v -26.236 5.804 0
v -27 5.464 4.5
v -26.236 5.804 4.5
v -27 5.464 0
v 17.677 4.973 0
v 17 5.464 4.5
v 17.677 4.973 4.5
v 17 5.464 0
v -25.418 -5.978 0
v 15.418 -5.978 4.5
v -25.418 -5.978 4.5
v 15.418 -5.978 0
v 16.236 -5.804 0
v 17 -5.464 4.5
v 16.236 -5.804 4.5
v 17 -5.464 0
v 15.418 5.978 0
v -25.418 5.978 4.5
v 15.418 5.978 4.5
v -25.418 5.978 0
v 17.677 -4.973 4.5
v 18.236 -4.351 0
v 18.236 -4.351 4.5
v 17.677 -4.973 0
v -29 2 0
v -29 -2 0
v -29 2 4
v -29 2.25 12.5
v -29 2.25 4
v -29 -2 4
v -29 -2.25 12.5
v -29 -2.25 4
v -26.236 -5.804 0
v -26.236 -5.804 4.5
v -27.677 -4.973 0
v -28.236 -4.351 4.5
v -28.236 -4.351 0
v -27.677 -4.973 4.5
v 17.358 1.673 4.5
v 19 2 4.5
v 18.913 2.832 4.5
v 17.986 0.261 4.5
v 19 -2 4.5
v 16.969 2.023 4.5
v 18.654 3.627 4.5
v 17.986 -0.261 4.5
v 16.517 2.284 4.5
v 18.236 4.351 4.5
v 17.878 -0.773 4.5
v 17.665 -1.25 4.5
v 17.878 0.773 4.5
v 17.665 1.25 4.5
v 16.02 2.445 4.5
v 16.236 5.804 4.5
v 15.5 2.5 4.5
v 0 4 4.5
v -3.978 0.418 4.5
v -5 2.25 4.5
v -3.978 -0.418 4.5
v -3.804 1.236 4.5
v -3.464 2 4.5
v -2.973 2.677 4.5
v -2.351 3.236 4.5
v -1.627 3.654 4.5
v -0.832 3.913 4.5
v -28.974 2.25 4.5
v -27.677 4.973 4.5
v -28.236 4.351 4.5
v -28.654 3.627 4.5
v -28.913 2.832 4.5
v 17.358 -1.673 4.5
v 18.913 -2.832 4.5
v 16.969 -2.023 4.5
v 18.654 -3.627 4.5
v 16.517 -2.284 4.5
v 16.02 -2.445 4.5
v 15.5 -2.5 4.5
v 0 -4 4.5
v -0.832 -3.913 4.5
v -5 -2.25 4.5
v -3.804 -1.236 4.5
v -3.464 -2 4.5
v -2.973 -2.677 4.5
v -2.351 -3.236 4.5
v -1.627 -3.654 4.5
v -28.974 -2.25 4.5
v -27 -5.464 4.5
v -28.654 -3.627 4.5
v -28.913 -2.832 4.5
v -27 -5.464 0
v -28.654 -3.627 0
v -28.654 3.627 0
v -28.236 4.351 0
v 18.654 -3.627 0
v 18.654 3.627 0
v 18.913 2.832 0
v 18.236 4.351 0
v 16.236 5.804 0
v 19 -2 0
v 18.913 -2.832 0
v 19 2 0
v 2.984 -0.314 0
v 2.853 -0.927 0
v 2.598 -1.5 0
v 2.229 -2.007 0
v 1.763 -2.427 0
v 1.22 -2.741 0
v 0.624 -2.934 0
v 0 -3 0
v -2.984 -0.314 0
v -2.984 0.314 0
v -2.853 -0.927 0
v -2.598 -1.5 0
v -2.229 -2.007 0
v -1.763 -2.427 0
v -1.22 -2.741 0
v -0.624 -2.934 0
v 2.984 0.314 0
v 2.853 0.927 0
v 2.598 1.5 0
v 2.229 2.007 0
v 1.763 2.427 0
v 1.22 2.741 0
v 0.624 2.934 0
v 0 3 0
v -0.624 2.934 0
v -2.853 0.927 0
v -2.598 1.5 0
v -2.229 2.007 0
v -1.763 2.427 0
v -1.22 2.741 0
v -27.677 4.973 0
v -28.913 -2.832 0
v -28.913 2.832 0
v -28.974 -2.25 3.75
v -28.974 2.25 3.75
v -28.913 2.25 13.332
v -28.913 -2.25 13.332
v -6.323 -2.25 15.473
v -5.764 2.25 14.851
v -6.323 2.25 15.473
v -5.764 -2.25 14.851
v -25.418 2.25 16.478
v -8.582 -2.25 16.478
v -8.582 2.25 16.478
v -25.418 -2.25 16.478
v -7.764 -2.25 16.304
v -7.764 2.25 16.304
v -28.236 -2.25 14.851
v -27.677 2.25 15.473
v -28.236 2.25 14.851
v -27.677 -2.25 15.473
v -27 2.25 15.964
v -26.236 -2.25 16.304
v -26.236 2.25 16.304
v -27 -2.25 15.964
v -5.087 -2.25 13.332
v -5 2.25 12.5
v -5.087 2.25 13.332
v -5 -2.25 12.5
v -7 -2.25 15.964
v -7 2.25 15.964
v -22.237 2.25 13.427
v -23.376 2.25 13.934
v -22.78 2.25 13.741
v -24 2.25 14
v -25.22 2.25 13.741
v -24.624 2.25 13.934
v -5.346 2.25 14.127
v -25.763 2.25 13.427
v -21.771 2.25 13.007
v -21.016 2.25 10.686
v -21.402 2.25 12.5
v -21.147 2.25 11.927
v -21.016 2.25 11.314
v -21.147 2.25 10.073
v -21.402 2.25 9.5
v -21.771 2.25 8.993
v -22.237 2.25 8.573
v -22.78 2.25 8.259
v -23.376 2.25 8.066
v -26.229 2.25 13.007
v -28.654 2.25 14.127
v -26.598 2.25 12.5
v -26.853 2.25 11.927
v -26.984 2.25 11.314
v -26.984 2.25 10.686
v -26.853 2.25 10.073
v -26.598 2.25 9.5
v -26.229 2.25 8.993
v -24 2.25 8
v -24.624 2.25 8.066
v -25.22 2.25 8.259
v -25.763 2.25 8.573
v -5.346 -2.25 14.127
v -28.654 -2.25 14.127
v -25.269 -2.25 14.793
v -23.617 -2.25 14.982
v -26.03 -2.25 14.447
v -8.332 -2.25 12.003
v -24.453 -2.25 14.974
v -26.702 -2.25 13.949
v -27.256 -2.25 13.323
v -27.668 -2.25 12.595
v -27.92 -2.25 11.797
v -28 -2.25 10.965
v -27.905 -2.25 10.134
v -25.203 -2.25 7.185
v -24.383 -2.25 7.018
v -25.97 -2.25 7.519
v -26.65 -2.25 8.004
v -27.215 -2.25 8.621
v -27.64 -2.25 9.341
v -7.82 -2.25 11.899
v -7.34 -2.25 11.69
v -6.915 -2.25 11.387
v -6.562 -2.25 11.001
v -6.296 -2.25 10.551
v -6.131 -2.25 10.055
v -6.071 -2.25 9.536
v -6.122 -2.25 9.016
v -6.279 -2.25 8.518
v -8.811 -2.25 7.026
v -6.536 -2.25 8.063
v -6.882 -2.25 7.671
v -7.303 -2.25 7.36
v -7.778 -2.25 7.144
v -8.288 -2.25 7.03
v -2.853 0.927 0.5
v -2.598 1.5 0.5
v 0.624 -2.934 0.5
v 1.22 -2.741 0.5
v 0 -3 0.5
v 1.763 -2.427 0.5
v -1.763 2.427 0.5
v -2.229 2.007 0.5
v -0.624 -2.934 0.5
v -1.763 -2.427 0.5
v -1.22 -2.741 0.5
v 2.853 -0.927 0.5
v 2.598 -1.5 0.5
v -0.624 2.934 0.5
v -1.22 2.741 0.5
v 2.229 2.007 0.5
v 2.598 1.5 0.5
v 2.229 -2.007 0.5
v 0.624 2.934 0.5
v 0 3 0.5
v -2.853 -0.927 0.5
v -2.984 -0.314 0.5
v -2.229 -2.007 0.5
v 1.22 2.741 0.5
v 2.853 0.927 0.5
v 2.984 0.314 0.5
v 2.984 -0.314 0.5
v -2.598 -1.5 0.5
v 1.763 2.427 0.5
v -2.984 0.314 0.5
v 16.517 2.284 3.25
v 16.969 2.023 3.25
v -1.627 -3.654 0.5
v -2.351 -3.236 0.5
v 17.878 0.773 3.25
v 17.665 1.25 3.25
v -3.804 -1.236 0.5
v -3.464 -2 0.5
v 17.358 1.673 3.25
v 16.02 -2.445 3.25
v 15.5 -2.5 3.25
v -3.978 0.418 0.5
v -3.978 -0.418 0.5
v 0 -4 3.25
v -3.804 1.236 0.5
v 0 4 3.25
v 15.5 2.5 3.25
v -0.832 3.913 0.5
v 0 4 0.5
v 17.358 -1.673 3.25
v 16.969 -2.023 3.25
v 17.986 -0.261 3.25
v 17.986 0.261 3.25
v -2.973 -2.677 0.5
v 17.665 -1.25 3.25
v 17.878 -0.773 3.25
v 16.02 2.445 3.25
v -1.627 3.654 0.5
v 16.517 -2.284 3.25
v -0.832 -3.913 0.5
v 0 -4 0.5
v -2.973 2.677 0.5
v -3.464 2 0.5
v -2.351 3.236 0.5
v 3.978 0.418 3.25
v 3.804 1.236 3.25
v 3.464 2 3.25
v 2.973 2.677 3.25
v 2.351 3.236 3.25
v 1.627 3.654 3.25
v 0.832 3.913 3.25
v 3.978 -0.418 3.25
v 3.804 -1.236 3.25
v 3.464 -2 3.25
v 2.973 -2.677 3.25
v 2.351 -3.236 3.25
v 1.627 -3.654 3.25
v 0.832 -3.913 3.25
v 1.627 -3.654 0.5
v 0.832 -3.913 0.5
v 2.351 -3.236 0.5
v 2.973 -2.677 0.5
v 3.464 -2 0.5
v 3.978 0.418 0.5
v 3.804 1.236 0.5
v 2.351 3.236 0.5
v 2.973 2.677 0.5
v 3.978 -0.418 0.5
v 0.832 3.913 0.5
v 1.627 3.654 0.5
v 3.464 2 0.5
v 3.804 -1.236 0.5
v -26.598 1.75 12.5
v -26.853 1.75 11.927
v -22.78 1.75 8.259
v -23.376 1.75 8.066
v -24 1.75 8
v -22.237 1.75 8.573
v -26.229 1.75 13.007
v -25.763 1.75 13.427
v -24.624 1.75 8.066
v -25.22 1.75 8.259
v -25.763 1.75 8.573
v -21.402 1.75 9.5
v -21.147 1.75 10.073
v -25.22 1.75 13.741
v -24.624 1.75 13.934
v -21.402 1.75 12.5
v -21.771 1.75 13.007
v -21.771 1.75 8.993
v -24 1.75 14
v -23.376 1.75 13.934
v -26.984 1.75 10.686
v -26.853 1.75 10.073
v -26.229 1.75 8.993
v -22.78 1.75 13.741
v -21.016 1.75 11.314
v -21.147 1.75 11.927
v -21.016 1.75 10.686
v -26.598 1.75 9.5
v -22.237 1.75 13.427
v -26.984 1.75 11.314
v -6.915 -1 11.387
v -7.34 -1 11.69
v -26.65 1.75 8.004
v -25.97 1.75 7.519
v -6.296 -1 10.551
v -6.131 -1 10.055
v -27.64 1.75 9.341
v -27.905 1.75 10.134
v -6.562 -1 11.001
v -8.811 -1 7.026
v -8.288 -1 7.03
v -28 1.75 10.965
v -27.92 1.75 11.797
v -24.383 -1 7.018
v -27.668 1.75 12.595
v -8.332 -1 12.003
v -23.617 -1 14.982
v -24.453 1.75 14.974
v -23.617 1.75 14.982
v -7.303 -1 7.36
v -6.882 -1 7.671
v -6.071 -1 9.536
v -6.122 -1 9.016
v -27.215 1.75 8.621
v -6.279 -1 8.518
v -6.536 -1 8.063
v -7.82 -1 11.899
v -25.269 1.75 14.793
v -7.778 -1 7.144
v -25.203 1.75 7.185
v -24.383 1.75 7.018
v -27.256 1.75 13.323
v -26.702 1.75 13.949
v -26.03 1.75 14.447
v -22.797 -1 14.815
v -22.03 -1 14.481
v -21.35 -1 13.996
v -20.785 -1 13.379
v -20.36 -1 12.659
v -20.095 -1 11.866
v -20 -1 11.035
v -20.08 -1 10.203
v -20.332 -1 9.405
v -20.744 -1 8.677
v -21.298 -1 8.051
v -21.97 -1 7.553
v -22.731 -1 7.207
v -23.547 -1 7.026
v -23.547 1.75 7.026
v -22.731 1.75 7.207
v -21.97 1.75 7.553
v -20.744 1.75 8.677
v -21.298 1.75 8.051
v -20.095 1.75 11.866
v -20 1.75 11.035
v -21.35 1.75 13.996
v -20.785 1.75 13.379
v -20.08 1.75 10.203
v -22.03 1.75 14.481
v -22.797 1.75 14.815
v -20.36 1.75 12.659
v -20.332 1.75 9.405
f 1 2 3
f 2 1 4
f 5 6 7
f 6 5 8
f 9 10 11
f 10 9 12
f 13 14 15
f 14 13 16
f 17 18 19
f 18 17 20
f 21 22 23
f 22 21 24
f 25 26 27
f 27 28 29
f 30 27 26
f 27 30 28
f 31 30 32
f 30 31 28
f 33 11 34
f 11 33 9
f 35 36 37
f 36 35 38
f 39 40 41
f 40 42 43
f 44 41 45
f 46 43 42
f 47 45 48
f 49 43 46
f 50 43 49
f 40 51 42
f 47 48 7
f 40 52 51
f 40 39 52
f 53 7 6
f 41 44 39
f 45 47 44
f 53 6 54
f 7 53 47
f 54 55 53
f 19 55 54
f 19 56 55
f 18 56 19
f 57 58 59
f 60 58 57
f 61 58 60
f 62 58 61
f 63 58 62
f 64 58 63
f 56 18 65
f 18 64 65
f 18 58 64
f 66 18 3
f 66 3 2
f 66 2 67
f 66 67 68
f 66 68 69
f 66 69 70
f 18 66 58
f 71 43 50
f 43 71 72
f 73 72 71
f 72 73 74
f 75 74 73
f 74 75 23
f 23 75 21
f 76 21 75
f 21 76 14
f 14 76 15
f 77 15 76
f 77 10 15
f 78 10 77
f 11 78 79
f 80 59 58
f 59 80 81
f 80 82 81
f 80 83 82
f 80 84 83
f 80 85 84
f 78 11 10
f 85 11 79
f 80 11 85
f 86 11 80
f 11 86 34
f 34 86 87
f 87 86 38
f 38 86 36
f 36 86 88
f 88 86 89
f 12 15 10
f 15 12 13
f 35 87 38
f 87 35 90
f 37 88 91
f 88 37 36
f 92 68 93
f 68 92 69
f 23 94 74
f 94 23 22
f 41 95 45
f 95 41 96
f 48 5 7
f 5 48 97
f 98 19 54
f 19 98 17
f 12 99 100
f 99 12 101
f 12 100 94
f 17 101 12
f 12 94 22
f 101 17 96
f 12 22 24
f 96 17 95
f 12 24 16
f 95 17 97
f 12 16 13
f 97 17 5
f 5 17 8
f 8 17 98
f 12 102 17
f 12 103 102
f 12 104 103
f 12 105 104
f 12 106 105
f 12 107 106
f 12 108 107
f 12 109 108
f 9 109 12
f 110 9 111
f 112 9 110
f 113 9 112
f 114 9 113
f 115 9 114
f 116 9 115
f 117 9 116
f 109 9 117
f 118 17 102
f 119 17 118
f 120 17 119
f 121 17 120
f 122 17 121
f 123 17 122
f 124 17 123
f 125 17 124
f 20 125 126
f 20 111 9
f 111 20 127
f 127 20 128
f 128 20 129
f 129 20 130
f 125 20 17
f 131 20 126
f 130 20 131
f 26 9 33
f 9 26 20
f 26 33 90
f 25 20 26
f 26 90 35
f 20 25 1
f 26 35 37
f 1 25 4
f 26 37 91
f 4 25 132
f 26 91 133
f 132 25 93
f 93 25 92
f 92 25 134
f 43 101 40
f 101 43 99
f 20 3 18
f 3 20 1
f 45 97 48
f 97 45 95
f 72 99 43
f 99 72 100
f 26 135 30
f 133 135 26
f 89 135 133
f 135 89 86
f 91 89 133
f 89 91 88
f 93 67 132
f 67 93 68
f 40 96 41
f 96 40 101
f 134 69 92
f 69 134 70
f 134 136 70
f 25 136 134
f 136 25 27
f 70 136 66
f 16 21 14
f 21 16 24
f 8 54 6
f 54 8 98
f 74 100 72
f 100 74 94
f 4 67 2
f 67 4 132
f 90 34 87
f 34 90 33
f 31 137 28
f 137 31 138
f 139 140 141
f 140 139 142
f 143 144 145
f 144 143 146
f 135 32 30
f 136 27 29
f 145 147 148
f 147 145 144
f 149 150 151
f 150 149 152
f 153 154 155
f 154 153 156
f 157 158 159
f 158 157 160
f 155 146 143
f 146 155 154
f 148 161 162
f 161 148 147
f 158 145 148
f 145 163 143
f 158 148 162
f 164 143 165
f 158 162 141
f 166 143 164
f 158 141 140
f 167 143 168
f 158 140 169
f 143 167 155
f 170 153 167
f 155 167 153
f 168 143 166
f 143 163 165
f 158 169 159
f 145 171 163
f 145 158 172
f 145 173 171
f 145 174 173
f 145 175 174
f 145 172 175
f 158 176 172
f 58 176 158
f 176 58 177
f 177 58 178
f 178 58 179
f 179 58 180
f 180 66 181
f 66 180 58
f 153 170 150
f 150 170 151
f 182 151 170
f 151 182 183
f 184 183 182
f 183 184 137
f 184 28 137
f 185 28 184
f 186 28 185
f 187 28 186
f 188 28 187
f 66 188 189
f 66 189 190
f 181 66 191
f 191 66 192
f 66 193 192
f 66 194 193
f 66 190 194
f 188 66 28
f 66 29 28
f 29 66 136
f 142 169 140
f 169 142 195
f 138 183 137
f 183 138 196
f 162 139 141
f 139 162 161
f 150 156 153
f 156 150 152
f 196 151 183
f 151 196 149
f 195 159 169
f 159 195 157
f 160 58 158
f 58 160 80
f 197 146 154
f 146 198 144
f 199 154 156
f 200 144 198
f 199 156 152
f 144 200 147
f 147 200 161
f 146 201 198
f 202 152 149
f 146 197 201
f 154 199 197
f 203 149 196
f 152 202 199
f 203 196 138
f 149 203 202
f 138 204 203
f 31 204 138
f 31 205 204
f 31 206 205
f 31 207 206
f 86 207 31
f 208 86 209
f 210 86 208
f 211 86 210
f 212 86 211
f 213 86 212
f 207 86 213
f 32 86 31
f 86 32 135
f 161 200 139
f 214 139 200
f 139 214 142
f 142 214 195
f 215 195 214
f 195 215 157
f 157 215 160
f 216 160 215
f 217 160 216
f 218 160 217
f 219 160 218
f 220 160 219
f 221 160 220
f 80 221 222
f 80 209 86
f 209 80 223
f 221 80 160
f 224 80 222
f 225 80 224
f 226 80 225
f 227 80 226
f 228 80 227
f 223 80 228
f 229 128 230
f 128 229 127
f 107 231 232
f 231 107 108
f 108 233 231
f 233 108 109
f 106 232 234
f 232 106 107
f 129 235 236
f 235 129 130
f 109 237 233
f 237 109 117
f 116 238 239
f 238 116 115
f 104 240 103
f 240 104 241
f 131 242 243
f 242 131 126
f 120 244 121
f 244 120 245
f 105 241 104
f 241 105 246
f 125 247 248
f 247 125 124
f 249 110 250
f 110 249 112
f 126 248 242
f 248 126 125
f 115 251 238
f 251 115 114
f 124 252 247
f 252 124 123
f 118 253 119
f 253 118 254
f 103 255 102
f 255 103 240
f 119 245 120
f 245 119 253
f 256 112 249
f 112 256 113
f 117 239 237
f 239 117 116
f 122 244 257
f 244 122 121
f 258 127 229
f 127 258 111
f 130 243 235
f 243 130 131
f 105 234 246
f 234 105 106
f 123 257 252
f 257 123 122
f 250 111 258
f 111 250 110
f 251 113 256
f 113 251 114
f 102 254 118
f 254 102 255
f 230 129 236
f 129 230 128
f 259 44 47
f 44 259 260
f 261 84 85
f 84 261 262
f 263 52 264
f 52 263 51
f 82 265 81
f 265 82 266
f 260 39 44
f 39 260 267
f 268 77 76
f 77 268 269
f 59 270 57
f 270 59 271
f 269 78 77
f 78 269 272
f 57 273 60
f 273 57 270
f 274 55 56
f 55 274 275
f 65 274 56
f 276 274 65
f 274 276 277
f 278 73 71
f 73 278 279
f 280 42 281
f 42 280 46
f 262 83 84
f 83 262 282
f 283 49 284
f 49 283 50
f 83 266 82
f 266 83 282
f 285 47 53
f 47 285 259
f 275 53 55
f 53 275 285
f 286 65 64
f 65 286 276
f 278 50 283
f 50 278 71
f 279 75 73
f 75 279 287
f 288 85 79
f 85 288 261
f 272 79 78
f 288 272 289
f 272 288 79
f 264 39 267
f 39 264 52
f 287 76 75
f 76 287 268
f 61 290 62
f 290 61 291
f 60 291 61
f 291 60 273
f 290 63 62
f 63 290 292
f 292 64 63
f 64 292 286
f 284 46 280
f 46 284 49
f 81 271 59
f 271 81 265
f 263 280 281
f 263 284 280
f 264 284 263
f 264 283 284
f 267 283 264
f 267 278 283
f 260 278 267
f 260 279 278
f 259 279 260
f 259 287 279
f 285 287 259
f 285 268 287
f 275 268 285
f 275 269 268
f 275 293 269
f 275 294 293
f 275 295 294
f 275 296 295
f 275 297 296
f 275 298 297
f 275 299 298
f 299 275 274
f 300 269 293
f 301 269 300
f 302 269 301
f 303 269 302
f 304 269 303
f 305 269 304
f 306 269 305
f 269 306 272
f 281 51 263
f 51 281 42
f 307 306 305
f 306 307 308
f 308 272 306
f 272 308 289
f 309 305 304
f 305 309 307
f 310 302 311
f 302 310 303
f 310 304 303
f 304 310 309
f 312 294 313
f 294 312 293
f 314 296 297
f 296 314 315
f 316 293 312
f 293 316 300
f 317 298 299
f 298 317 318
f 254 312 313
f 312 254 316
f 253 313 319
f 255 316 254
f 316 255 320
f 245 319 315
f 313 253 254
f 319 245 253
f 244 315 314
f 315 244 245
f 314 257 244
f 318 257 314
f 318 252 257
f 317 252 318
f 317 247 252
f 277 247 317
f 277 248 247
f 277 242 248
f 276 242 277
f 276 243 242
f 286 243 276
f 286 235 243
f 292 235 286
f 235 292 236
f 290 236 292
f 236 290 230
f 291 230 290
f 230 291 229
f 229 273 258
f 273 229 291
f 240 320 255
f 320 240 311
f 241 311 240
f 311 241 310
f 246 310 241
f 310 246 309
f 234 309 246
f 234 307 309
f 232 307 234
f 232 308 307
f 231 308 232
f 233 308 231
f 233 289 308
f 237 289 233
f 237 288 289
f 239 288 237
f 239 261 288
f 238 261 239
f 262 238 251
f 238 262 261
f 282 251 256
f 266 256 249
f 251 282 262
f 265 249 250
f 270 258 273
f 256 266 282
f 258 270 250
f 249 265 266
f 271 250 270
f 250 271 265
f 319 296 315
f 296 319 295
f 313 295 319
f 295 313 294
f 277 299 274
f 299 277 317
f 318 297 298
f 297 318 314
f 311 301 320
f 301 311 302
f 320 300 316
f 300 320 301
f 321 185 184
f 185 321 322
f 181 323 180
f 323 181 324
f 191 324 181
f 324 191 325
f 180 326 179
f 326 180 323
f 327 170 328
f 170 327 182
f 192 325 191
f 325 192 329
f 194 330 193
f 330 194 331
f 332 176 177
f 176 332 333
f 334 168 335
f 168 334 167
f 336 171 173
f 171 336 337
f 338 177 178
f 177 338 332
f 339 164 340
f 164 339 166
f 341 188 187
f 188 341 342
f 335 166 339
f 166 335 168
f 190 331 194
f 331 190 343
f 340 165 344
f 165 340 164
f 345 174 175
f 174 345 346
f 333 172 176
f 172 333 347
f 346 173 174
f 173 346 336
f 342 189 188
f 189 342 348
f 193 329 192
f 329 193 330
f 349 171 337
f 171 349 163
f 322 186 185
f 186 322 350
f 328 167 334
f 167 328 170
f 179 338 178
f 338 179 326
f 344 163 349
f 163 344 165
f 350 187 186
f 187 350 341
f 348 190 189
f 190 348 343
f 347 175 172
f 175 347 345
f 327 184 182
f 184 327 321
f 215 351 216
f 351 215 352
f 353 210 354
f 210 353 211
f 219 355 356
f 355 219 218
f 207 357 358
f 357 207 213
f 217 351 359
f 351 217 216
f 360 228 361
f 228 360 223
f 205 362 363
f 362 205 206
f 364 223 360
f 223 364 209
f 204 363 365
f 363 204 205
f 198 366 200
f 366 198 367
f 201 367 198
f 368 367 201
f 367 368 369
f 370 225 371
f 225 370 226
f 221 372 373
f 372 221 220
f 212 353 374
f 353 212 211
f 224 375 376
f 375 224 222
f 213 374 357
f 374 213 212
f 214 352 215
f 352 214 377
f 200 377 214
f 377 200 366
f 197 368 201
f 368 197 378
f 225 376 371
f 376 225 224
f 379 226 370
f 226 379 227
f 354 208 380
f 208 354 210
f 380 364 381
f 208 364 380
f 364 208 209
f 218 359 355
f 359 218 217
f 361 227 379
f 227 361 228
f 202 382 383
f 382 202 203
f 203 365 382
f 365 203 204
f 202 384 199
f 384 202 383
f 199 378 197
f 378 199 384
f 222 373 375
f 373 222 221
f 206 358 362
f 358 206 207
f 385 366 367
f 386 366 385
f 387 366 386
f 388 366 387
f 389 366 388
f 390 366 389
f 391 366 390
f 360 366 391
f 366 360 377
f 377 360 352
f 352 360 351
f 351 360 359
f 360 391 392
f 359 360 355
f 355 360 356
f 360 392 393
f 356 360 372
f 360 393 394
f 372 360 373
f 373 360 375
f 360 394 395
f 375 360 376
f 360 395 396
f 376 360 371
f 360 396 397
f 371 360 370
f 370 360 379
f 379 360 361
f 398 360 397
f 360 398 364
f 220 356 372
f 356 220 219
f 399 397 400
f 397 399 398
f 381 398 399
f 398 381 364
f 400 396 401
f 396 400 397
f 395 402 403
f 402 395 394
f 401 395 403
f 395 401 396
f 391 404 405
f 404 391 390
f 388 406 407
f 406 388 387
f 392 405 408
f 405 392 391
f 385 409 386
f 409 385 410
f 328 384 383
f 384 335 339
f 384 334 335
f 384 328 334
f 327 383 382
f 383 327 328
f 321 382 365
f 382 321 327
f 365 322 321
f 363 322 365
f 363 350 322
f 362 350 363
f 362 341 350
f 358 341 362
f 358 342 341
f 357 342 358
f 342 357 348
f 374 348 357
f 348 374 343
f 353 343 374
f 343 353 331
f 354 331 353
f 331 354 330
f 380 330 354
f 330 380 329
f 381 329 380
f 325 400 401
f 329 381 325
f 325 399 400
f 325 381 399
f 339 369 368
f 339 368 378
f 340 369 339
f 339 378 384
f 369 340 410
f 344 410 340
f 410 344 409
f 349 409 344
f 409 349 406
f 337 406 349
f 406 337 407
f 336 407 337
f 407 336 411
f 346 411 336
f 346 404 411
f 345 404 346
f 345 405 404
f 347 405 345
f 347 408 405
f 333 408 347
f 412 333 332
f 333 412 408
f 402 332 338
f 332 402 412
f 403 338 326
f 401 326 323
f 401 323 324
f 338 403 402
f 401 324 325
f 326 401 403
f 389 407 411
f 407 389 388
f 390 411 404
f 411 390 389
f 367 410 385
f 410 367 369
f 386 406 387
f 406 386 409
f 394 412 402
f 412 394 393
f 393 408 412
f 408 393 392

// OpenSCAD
SERVO_WIDTH = 12;
SERVO_LENGTH = 22;
SERVO_HEIGHT = 28;

SERVO_TAB_LENGTH = 32;
SERVO_TAB_THICKNESS = 2.5;
SERVO_TAB_HEIGHT = 17;

SERVO_NUB_DIA = 6;
SERVO_NUB_HEIGHT = 5;
SERVO_NUB_OFFSET = SERVO_LENGTH/2 - 6;

SERVO_MOUNT_HOLE_DIA = 2;
SERVO_MOUNT_HOLE_SPACING = 28;

SERVO_ARM_DIA1 = 8; 
SERVO_ARM_DIA2 = 5;
SERVO_ARM_LENGTH = 22;
SERVO_ARM_THICKNESS = 4;
SERVO_ARM_FLAT_THICKNESS = 1.25;
SERVO_ARM_HEIGHT = SERVO_HEIGHT + SERVO_NUB_HEIGHT - SERVO_ARM_THICKNESS;

TOWER_SPACING = 0.5;

TOWER_MOUNT_WIDTH = SERVO_WIDTH;
TOWER_MOUNT_LENGTH = 2 * SERVO_ARM_LENGTH + 4;
TOWER_MOUNT_HEIGHT = SERVO_WIDTH + SERVO_ARM_THICKNESS + TOWER_SPACING;
TOWER_MOUNT_THICKNESS = SERVO_ARM_THICKNESS + TOWER_SPACING;
TOWER_MOUNT_CORNER_DIA = SERVO_ARM_DIA1;
TOWER_MOUNT_LIP = 1;

TOWER_LENGTH = 60;
TOWER_WIDTH = 80;
TOWER_BASE_THICKNESS = TOWER_SPACING + SERVO_ARM_THICKNESS;
TOWER_CORNER_DIA = 10;


$fn = 30;

module servo() {
  translate([0, SERVO_NUB_OFFSET, 0]) {
    translate([-SERVO_WIDTH/2, -SERVO_LENGTH/2, 0])
    cube(size = [SERVO_WIDTH, SERVO_LENGTH, SERVO_HEIGHT]);

    translate([-SERVO_WIDTH/2, -SERVO_TAB_LENGTH/2, SERVO_TAB_HEIGHT])
    cube(size = [SERVO_WIDTH, SERVO_TAB_LENGTH, SERVO_TAB_THICKNESS]);
    
    translate([0, -SERVO_NUB_OFFSET, 0])
    cylinder(d = SERVO_NUB_DIA, h = SERVO_HEIGHT + SERVO_NUB_HEIGHT);

    for(i = [-1, 1]) {
      translate([0, i * SERVO_MOUNT_HOLE_SPACING/2, 0])
      cylinder(d = SERVO_MOUNT_HOLE_DIA, h = SERVO_HEIGHT);
    }
  }
}

module servo_arm(sides = 1) {
  for(i = [1 : sides]) {
    rotate([0, 0, i * 360/sides])
    translate([0, 0, SERVO_ARM_THICKNESS - SERVO_ARM_FLAT_THICKNESS])
    hull() {
      cylinder(d = SERVO_ARM_DIA1, h = SERVO_ARM_FLAT_THICKNESS);
      translate([0, SERVO_ARM_LENGTH - SERVO_ARM_DIA1/2 - SERVO_ARM_DIA2/2, 0])
      cylinder(d = SERVO_ARM_DIA2, h = SERVO_ARM_FLAT_THICKNESS);
    }
    
    cylinder(d = SERVO_ARM_DIA1, h = SERVO_ARM_THICKNESS);
  }
}

module rounded_rect(width, length, height, corner_dia) {
  hull() {
    for(i = [-1, 1]) {
      for(j = [-1, 1]) {
        translate([i * (length - corner_dia)/2, j * (width - corner_dia)/2, 0])
        cylinder(d = corner_dia, h = height);
      }
    }
  }
}

module servo_placement() {
  #translate([0, 0, TOWER_SPACING])
  rotate([0, 0, -90]) {
    translate([0, 0, -SERVO_ARM_HEIGHT])
    servo();
    servo_arm(1);
  }
  
  delta = -SERVO_ARM_LENGTH - 2 * TOWER_MOUNT_LIP;
  #translate([delta, -TOWER_SPACING + TOWER_MOUNT_THICKNESS/2, SERVO_WIDTH/2 + TOWER_MOUNT_THICKNESS + TOWER_SPACING])
  rotate([90, 90, 0]) {
    translate([0, 0, -SERVO_ARM_HEIGHT])
    servo();
    rotate([0, 0, -5.5])
    servo_arm(1);    
  }
}

module tower_mount() {
  difference() {
    translate([-TOWER_MOUNT_LENGTH/2 + SERVO_ARM_LENGTH - SERVO_ARM_DIA1/2 + TOWER_MOUNT_LIP, 0, 0])
    union() {
      rounded_rect(TOWER_MOUNT_WIDTH, TOWER_MOUNT_LENGTH, TOWER_MOUNT_THICKNESS, TOWER_MOUNT_CORNER_DIA);

      l = TOWER_MOUNT_LENGTH - SERVO_ARM_LENGTH - 2 * TOWER_MOUNT_LIP;
      rotate([90, 0, 0])
      translate([-TOWER_MOUNT_LENGTH/2 + l/2, TOWER_MOUNT_HEIGHT/2, -TOWER_MOUNT_THICKNESS/2])
      rounded_rect(TOWER_MOUNT_HEIGHT, l, TOWER_MOUNT_THICKNESS, TOWER_MOUNT_CORNER_DIA);

    }
    
    servo_placement();
  }
}

tower_mount();
